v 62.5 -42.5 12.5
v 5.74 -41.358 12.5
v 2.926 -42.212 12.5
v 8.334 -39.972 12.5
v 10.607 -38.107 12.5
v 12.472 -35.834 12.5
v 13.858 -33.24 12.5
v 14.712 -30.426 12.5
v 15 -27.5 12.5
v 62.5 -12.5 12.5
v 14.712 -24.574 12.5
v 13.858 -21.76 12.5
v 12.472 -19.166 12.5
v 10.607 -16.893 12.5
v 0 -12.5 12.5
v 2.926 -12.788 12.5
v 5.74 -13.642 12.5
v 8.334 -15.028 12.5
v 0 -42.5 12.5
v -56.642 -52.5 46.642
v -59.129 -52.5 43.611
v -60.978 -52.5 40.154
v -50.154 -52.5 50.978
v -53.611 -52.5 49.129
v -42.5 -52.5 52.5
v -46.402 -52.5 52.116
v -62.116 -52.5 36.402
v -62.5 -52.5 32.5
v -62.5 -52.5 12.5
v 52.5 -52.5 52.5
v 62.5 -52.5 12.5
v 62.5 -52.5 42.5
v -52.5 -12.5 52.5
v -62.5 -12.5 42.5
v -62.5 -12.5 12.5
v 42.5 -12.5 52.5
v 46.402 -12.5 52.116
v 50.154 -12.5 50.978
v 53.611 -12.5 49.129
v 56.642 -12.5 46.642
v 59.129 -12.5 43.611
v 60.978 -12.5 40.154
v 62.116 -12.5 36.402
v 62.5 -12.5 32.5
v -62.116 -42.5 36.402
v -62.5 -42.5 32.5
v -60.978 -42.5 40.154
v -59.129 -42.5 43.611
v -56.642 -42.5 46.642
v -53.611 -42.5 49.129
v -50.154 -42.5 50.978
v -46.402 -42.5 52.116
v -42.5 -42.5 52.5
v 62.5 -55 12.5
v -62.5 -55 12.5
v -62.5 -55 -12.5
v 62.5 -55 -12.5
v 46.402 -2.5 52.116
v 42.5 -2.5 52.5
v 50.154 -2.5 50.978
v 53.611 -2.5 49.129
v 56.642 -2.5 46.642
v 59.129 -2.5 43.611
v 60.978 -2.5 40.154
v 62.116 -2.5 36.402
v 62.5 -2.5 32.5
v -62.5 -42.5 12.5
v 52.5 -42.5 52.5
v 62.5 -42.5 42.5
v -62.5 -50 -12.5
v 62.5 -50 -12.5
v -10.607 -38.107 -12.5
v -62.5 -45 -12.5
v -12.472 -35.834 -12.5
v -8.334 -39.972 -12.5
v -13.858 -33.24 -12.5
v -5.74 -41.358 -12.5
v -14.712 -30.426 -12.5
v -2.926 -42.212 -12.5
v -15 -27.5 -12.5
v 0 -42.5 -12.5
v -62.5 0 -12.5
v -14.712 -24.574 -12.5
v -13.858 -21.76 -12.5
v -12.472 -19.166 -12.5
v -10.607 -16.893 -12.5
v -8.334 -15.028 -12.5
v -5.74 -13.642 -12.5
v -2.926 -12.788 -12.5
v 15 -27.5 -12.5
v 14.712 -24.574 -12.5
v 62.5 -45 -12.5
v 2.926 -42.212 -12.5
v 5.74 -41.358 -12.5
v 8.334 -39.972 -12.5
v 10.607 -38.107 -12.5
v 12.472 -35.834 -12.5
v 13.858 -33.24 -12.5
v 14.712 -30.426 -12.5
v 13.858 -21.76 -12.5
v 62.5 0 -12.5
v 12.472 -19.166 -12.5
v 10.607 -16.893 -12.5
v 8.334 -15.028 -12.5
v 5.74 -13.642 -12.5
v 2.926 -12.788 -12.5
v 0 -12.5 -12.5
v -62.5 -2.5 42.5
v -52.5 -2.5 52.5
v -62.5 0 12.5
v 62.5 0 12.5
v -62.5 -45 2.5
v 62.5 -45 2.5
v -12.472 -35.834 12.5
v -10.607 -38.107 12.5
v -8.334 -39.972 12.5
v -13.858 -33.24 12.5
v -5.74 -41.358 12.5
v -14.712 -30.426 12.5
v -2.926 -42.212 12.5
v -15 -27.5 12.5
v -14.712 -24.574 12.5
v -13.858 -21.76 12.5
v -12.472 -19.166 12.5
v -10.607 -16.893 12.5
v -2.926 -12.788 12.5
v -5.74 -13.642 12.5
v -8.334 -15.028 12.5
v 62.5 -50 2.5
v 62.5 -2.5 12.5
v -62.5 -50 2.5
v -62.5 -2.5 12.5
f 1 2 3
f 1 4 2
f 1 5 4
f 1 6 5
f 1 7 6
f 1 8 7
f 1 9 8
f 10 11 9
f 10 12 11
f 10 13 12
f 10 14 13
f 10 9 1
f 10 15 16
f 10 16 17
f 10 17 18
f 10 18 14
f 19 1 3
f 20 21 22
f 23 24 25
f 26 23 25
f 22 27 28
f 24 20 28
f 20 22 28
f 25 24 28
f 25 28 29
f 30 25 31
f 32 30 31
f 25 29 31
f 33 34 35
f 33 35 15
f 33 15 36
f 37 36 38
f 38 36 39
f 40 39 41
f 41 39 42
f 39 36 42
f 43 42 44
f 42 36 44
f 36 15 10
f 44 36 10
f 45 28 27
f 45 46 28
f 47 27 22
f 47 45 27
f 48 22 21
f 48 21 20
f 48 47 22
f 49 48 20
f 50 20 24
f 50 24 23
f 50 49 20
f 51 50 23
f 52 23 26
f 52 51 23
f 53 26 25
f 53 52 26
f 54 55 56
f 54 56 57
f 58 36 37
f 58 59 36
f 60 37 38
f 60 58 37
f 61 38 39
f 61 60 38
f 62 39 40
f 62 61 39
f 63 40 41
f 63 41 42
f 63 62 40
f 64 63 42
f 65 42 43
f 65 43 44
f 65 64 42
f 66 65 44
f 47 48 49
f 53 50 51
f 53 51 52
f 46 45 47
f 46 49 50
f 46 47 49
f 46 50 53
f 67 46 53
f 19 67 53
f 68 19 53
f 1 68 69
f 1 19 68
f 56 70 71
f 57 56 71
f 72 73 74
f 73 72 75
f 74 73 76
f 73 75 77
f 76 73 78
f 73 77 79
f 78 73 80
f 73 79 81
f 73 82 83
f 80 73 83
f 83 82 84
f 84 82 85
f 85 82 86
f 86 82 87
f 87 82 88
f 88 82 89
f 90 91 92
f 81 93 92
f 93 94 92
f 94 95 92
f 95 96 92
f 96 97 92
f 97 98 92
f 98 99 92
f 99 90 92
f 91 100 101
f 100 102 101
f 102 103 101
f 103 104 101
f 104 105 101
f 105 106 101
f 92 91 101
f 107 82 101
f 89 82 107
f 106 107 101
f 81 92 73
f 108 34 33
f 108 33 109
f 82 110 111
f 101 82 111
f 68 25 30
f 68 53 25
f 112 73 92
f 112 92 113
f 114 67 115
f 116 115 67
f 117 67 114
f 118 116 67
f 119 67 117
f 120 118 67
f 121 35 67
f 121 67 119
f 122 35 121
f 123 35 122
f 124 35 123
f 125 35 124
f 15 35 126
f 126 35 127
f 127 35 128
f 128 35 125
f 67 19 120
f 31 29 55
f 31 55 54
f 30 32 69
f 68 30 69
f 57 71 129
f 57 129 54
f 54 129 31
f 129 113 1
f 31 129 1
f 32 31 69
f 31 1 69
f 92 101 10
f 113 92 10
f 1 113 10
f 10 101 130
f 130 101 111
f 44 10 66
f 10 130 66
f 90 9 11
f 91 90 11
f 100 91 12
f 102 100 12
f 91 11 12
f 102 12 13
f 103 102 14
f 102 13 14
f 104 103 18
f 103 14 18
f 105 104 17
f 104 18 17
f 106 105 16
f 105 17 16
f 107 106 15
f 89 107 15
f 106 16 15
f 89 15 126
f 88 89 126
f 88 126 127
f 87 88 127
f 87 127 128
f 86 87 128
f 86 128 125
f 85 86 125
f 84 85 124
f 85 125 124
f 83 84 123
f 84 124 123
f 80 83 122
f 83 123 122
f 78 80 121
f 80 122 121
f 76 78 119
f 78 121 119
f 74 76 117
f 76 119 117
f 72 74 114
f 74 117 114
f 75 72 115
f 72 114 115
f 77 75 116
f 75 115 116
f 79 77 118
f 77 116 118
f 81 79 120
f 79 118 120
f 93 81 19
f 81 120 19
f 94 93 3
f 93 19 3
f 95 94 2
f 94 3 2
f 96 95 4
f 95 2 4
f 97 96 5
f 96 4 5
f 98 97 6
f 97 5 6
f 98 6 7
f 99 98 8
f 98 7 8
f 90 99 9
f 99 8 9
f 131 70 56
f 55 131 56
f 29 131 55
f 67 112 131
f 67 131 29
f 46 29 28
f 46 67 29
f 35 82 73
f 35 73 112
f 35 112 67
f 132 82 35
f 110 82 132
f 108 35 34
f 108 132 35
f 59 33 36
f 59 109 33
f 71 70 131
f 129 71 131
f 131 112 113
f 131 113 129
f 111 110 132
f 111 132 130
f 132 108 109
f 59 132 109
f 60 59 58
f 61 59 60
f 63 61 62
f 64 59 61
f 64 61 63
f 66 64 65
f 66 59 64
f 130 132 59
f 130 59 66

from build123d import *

# Parameters (mm, degrees)
F0_W      = 125
F0_H      = 25
F1_DEPTH  = 55
F2_W      = 5
F2_H      = 30
F3_DEPTH  = 125.001
F4_W      = 125
F4_H      = 10
F5_DEPTH  = 40
F6_R      = 20
F7_R      = 20
F8_SIZE   = 10
F9_SIZE   = 10
F10_R     = 15
F11_DEPTH = 25.001


with BuildPart() as f1:
    # F0 (on Front) → F1 (new body)
    with BuildSketch(Plane.XZ):
        Rectangle(F0_W, F0_H)
    extrude(amount=F1_DEPTH)

    # F2 (on face) → F3 (cut, through all)
    with BuildSketch(Plane(origin=(-62.5, 0, 0), x_dir=(0, -1, 0), z_dir=(-1, 0, 0))):
        with Locations((47.5, -12.5)):
            Rectangle(F2_W, F2_H)
    extrude(amount=-F3_DEPTH, mode=Mode.SUBTRACT)

    # F4 (on face) → F5 (join)
    with BuildSketch(Plane.XY.offset(12.5)):
        with Locations((0, -47.5)):
            Rectangle(F4_W, F4_H)
        with Locations((0, -7.5)):
            Rectangle(F4_W, F4_H)
    extrude(amount=F5_DEPTH)

    # F6
    f6_edges = [f1.edges().sort_by_distance(p)[0] for p in [
        (-62.5, -47.5, 52.5),
    ]]
    fillet(f6_edges, radius=F6_R)

    # F7
    f7_edges = [f1.edges().sort_by_distance(p)[0] for p in [
        (62.5, -7.5, 52.5),
    ]]
    fillet(f7_edges, radius=F7_R)

    # F8
    f8_edges = [f1.edges().sort_by_distance(p)[0] for p in [
        (62.5, -47.5, 52.5),
    ]]
    chamfer(f8_edges, length=F8_SIZE)

    # F9
    f9_edges = [f1.edges().sort_by_distance(p)[0] for p in [
        (-62.5, -7.5, 52.5),
    ]]
    chamfer(f9_edges, length=F9_SIZE)

    # F10 (on face) → F11 (cut, through all)
    with BuildSketch(Plane.XY.offset(12.5)):
        with Locations((0, -27.5)):
            Circle(F10_R)
    extrude(amount=-F11_DEPTH, mode=Mode.SUBTRACT)


solid = f1.part
